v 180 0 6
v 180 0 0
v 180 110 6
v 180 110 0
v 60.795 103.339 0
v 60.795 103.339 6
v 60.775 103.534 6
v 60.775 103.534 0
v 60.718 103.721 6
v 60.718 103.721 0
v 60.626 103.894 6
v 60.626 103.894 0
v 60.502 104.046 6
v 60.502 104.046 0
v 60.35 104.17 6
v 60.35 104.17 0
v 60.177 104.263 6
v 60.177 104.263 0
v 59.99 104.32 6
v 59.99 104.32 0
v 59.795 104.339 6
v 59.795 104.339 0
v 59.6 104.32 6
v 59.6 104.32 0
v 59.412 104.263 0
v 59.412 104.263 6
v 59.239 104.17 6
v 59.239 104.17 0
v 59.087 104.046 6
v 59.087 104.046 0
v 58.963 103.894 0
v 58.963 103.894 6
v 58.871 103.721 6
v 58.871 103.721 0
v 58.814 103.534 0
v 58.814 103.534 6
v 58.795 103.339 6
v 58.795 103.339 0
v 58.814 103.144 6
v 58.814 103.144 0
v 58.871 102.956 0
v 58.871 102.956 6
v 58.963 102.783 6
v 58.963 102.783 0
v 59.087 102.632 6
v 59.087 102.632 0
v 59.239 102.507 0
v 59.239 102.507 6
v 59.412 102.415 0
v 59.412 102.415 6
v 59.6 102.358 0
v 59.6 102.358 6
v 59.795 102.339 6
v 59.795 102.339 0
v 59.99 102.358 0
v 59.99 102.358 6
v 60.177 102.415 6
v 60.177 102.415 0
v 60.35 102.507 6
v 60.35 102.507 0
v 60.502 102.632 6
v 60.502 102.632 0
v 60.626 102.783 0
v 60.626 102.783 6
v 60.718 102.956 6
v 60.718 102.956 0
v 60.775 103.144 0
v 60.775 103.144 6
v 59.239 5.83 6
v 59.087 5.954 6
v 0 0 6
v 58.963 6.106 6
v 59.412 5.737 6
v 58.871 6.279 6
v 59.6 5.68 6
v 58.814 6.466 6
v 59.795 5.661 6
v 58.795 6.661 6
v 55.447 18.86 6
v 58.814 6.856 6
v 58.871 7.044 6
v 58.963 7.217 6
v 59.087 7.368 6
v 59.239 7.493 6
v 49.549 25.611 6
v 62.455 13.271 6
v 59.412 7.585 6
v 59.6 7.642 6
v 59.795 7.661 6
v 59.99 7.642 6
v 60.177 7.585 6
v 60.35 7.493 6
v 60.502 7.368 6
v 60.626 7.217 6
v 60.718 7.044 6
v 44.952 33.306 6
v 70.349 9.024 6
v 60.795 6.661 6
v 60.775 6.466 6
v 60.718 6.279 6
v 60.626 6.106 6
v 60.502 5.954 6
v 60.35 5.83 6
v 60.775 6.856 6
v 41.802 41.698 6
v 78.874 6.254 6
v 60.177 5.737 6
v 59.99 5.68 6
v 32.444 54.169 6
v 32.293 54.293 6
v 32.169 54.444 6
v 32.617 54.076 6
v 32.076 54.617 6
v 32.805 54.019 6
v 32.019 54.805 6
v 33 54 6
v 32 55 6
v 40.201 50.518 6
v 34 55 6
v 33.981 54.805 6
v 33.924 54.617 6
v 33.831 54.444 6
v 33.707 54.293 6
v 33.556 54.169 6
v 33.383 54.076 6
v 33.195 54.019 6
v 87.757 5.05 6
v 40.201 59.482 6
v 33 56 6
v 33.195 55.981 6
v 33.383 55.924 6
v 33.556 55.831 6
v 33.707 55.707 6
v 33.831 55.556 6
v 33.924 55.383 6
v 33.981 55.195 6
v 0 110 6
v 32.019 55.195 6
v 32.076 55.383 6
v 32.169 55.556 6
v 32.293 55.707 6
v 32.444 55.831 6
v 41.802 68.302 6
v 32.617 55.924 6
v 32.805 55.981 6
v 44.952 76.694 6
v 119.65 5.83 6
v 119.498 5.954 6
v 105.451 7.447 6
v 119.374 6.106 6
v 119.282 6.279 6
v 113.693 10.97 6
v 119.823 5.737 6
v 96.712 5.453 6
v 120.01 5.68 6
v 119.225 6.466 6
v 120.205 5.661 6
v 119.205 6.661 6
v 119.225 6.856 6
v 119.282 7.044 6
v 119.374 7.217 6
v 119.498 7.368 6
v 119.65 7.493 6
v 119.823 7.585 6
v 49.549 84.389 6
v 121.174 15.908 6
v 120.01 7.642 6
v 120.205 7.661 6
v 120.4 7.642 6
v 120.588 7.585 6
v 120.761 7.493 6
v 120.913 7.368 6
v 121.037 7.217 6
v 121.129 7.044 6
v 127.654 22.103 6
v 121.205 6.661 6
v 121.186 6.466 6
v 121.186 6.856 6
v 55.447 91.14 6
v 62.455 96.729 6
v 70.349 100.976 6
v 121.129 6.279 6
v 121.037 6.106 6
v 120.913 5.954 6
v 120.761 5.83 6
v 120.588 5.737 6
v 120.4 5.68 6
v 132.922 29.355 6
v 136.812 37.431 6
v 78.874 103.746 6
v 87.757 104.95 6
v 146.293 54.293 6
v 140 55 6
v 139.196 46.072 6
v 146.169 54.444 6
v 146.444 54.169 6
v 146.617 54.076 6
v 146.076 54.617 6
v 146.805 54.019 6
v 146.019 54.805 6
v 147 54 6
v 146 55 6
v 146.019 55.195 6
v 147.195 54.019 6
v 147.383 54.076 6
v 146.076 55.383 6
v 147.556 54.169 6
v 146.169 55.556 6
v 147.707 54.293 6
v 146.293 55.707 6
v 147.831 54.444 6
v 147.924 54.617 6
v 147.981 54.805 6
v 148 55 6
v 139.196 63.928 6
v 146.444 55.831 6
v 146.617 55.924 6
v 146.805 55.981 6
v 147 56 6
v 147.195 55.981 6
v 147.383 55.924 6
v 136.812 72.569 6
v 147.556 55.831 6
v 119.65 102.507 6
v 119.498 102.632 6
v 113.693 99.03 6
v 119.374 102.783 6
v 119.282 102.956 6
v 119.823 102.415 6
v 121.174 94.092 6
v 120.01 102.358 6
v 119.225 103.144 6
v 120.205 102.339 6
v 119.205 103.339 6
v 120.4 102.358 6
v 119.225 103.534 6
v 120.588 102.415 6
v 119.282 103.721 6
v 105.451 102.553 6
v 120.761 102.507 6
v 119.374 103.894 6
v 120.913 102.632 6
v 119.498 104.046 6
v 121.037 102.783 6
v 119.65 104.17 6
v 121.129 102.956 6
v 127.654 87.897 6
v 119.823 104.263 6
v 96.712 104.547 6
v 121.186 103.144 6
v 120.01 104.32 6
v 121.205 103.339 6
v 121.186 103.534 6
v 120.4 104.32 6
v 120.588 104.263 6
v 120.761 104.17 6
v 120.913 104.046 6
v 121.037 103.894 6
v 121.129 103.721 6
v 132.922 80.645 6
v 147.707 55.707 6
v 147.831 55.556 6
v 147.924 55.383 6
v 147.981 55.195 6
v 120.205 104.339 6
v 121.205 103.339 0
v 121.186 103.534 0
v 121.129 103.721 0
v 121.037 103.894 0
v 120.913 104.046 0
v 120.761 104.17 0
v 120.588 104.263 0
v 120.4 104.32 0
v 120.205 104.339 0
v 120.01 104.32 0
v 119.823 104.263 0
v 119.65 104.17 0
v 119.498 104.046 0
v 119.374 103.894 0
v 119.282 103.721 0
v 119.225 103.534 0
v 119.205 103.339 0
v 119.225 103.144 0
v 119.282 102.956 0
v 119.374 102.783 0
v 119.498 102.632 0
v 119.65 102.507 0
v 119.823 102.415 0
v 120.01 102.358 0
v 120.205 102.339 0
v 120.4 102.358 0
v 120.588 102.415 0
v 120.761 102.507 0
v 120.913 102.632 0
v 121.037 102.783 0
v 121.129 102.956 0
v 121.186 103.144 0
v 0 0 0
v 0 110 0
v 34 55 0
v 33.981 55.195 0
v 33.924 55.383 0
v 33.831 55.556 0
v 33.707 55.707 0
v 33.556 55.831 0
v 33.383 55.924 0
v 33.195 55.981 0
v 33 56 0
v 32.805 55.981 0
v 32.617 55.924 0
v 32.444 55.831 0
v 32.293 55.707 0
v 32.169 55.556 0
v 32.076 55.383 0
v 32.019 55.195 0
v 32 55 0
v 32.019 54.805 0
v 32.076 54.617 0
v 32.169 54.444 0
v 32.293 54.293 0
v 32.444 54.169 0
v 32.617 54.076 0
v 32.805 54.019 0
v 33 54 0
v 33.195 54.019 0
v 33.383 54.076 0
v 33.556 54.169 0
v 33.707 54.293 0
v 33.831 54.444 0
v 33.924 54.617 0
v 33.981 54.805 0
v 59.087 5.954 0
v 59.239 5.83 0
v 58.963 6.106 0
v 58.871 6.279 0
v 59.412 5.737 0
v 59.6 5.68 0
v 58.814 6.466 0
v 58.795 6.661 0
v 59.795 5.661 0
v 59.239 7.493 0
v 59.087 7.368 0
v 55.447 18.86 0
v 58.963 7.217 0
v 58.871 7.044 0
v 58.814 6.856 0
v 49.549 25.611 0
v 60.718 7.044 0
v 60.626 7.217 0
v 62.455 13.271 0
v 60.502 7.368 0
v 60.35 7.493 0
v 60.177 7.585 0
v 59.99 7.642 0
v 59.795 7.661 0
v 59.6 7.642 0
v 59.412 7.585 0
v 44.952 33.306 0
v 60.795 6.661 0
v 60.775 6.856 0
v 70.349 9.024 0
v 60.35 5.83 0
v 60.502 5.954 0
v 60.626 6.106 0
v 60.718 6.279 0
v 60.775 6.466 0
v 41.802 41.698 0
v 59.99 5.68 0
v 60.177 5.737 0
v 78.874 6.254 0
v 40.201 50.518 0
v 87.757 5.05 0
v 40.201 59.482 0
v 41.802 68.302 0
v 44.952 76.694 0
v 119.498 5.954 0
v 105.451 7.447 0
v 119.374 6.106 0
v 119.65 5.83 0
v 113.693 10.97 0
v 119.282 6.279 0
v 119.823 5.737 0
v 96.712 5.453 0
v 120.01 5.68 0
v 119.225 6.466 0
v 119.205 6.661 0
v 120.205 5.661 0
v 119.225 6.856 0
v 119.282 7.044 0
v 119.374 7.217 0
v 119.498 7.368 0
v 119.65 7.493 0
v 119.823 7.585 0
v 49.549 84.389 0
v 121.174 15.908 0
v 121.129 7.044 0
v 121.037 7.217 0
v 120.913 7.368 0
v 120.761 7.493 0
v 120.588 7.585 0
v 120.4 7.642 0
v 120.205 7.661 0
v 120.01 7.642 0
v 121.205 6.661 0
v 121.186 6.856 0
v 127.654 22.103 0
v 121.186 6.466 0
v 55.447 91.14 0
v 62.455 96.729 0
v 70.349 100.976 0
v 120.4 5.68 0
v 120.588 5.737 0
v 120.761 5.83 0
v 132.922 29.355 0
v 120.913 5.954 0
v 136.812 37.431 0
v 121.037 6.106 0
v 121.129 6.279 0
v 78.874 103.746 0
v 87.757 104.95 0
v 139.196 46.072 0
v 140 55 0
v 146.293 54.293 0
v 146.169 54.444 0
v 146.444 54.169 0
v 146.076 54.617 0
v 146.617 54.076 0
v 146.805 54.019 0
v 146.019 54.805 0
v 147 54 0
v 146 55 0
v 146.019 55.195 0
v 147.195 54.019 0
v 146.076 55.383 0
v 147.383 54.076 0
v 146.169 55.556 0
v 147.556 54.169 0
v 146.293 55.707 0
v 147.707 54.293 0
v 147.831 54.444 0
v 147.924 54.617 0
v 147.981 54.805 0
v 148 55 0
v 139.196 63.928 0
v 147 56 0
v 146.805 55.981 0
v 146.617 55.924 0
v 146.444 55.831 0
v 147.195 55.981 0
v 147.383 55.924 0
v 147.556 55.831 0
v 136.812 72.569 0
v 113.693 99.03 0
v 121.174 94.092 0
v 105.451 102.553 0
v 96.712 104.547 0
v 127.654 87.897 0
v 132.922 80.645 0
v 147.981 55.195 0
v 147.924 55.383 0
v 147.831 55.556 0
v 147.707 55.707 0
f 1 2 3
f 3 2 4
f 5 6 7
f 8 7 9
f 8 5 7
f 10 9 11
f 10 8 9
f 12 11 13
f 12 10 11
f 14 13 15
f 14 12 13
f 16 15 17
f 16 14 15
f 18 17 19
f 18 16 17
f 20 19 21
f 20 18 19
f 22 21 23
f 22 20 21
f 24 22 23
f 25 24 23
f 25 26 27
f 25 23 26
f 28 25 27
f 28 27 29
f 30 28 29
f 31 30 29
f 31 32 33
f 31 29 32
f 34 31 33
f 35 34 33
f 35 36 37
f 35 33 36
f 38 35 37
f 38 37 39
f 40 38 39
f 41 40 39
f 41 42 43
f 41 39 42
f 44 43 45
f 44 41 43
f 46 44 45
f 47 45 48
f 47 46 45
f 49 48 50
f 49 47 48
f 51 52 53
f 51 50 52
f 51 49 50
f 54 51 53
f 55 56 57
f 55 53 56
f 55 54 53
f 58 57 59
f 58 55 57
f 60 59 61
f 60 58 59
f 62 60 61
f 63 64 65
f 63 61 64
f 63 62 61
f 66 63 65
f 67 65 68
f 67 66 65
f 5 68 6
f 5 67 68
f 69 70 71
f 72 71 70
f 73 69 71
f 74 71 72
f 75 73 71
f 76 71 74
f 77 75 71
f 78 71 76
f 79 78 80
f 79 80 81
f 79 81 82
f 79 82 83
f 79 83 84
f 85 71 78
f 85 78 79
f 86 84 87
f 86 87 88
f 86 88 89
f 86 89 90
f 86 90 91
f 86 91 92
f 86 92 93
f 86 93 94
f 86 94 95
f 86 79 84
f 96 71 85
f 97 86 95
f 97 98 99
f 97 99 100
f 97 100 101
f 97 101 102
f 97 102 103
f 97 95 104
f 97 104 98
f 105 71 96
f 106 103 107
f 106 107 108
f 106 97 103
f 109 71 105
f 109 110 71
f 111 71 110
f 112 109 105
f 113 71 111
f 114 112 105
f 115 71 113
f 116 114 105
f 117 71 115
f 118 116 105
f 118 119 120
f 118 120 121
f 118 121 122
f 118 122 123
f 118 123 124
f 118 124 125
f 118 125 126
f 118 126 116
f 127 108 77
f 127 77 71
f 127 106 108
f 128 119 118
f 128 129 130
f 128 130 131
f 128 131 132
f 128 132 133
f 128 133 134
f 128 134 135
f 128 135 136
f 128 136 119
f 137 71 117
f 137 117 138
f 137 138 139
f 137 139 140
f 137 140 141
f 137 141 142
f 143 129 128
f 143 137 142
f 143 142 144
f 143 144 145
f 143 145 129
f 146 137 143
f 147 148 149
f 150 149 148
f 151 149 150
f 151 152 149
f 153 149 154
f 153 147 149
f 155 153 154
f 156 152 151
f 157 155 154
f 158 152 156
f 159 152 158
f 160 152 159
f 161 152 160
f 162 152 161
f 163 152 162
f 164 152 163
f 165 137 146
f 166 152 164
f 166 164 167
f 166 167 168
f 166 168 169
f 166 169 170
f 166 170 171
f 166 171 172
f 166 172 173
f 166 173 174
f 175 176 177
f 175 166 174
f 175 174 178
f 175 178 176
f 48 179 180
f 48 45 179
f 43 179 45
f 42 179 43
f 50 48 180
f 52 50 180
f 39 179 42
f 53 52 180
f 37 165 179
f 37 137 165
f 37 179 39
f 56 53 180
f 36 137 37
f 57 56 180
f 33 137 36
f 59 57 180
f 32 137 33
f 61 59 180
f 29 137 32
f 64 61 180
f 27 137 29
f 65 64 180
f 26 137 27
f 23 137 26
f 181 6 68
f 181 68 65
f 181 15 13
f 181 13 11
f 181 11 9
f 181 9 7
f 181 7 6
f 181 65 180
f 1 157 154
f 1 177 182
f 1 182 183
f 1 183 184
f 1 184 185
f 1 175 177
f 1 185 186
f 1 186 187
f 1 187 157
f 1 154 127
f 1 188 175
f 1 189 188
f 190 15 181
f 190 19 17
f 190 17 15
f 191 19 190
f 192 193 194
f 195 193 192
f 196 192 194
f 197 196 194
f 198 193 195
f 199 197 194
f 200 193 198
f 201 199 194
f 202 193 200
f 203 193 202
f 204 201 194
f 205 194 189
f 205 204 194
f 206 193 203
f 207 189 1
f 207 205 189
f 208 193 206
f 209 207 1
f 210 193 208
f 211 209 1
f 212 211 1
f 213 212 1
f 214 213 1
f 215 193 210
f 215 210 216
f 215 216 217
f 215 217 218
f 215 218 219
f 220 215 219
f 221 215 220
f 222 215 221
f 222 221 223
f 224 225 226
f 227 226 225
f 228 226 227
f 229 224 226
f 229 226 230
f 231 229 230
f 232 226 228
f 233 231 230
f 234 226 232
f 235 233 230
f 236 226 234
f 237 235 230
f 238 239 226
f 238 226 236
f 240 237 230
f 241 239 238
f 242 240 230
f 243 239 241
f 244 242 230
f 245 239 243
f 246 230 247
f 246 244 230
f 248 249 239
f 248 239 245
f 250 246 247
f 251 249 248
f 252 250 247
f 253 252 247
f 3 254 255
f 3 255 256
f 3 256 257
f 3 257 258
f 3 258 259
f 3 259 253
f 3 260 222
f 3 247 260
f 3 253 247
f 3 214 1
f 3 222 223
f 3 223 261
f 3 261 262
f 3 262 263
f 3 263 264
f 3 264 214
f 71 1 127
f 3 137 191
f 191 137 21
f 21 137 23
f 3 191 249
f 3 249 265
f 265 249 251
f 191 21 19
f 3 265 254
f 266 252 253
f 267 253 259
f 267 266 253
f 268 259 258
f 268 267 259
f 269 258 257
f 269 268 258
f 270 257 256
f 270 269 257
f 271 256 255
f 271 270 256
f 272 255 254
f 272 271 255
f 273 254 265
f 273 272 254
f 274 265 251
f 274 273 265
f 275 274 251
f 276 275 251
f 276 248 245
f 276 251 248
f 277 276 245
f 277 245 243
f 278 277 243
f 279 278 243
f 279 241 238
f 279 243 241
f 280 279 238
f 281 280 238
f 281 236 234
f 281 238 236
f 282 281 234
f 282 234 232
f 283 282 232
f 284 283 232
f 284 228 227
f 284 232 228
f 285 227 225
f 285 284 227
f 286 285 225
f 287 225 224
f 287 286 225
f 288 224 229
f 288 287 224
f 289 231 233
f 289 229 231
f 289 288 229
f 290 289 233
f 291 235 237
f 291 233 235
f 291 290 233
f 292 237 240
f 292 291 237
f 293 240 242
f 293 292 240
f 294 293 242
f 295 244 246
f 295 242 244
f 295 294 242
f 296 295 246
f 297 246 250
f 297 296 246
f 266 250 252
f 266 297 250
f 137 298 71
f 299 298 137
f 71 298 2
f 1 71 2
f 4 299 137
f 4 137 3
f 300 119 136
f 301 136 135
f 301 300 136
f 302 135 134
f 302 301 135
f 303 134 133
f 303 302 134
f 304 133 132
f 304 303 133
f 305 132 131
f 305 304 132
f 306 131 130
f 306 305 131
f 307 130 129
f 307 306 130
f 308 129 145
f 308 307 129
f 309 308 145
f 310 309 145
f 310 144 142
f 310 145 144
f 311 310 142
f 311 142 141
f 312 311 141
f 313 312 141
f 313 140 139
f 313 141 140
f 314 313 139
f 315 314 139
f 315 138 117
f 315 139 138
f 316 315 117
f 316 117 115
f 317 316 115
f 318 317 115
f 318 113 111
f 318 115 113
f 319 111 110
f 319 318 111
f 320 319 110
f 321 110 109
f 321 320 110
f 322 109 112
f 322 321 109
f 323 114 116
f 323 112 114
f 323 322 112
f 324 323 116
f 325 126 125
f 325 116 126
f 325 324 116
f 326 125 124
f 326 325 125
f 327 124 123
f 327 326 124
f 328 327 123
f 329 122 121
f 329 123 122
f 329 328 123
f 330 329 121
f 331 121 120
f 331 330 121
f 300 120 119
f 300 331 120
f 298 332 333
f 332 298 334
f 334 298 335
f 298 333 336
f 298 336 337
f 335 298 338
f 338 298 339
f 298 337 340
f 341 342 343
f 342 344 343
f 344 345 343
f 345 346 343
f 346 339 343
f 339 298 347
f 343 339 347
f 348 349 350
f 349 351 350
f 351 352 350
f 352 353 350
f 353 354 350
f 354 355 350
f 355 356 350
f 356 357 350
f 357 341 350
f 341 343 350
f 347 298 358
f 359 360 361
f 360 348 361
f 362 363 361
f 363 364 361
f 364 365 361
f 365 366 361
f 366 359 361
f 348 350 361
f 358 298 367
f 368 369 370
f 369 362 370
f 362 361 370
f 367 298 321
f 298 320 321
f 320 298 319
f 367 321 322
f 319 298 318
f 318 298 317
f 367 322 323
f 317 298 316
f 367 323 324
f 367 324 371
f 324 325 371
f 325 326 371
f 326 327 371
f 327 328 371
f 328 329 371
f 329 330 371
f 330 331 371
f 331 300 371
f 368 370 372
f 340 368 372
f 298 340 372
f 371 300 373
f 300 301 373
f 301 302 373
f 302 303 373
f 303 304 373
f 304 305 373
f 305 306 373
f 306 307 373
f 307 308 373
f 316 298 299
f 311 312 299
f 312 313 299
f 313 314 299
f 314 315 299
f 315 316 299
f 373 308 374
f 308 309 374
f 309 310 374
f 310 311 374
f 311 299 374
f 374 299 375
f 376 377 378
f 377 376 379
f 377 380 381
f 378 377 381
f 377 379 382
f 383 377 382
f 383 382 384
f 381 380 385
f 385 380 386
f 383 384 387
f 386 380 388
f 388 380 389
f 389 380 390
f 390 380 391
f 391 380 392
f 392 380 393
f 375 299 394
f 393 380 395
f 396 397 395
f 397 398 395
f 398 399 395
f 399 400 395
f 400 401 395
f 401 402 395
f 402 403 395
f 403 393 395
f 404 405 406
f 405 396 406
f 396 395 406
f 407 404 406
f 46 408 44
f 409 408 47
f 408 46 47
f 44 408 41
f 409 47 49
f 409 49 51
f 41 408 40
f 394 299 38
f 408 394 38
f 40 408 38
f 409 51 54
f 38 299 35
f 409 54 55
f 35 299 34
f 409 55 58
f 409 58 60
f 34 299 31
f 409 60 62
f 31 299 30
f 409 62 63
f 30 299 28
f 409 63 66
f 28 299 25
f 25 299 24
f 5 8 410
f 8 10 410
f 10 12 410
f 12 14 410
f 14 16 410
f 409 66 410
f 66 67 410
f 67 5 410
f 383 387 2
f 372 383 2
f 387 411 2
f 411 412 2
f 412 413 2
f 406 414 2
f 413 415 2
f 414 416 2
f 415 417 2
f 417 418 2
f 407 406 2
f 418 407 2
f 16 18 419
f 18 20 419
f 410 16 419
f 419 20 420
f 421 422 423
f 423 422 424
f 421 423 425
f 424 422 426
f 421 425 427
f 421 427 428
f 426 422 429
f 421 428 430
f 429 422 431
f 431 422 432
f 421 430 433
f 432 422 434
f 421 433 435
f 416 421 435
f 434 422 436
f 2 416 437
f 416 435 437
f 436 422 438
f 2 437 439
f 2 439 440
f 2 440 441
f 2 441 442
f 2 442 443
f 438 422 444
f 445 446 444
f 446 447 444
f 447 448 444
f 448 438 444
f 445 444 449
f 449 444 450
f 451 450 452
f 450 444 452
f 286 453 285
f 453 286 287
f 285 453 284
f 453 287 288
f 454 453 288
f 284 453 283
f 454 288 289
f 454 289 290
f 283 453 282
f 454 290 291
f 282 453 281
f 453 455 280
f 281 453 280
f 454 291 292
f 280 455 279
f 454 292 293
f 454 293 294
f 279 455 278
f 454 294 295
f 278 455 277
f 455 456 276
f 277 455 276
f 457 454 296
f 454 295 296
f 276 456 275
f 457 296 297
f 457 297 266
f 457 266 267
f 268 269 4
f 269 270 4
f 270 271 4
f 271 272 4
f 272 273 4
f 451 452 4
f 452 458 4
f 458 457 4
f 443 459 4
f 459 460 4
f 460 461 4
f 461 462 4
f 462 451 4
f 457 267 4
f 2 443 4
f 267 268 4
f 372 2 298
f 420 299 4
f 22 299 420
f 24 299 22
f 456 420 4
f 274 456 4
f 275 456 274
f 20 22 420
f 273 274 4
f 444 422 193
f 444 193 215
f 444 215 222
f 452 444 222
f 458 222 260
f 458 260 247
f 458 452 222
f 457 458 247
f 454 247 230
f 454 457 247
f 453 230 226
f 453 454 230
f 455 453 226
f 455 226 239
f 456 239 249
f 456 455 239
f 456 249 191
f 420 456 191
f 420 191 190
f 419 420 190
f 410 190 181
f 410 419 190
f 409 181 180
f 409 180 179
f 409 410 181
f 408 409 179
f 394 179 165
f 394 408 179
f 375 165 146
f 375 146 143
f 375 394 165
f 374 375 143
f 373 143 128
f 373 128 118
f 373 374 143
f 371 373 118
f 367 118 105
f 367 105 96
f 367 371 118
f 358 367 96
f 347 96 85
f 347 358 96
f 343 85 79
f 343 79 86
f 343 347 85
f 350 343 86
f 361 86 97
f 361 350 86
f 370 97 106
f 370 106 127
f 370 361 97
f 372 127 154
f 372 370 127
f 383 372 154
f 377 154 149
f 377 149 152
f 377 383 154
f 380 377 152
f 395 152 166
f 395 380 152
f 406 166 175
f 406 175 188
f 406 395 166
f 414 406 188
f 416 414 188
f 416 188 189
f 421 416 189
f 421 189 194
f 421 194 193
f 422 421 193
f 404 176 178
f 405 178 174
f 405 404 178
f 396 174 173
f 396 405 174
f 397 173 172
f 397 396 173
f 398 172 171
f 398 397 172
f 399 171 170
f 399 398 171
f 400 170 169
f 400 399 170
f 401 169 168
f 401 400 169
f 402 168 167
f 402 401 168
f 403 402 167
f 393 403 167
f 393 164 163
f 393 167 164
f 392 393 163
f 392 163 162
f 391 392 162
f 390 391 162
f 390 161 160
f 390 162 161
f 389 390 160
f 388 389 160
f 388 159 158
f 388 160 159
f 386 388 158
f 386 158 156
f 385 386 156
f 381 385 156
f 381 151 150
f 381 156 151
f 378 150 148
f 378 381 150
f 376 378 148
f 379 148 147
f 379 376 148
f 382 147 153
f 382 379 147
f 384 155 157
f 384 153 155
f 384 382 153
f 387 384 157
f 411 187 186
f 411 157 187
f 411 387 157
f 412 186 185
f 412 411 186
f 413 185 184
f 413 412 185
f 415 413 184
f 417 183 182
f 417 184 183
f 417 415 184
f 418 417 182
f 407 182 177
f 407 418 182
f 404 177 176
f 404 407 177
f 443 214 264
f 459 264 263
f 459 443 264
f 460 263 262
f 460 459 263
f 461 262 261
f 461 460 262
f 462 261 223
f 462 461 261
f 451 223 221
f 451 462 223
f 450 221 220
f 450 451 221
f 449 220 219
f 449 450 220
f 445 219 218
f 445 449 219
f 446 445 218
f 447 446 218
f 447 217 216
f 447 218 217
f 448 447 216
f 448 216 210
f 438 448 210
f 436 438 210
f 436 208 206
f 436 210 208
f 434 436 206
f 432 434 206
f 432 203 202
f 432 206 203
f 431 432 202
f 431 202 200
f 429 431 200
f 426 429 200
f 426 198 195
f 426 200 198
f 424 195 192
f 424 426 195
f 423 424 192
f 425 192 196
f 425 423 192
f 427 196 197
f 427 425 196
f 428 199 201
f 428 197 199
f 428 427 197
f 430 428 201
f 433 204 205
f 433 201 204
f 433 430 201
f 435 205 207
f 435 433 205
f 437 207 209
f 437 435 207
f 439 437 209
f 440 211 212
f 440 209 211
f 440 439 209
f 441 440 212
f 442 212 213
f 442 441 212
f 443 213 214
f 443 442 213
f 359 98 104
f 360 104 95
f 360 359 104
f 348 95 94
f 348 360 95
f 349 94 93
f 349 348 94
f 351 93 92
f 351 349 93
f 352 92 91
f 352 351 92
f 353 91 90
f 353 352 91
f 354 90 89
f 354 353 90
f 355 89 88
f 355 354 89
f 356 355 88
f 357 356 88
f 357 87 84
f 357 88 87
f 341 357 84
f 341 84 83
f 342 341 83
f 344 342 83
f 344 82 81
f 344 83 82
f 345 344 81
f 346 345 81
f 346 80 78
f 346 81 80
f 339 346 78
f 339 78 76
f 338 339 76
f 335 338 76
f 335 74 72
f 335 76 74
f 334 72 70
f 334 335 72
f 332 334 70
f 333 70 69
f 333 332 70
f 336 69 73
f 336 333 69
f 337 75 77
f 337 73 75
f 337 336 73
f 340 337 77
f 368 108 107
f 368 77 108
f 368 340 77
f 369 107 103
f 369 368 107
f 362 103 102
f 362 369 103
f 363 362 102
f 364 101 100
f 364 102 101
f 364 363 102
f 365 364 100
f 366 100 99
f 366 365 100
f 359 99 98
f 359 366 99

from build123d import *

# Parameters (mm, degrees)
SKETCH1_W           = 180
SKETCH1_H           = 110
BOSS_EXTRUDE1_DEPTH = 6
SKETCH2_R           = 50
CUT_EXTRUDE1_DEPTH  = 6
SKETCH4_R           = 1
CUT_EXTRUDE2_DEPTH  = 40


with BuildPart() as part:
    # Sketch1 → Boss-Extrude1 (new body)
    with BuildSketch(Plane.XY):
        with Locations((90, 55)):
            Rectangle(SKETCH1_W, SKETCH1_H)
    extrude(amount=BOSS_EXTRUDE1_DEPTH)

    # Sketch2 → Cut-Extrude1 (cut)
    with BuildSketch(Plane.XY):
        with Locations((90, 55)):
            Circle(SKETCH2_R)
    extrude(amount=CUT_EXTRUDE1_DEPTH, mode=Mode.SUBTRACT)

    # Sketch4 → Cut-Extrude2 (cut)
    with BuildSketch(Plane.XY):
        with Locations((59.794601939, 103.338741481)):
            Circle(SKETCH4_R)
        with Locations((120.205398061, 103.338741481)):
            Circle(SKETCH4_R)
        with Locations((147, 55)):
            Circle(SKETCH4_R)
        with Locations((120.205398061, 6.661258519)):
            Circle(SKETCH4_R)
        with Locations((59.794601939, 6.661258519)):
            Circle(SKETCH4_R)
        with Locations((33, 55)):
            Circle(SKETCH4_R)
    extrude(amount=CUT_EXTRUDE2_DEPTH, mode=Mode.SUBTRACT)


solid = part.part
